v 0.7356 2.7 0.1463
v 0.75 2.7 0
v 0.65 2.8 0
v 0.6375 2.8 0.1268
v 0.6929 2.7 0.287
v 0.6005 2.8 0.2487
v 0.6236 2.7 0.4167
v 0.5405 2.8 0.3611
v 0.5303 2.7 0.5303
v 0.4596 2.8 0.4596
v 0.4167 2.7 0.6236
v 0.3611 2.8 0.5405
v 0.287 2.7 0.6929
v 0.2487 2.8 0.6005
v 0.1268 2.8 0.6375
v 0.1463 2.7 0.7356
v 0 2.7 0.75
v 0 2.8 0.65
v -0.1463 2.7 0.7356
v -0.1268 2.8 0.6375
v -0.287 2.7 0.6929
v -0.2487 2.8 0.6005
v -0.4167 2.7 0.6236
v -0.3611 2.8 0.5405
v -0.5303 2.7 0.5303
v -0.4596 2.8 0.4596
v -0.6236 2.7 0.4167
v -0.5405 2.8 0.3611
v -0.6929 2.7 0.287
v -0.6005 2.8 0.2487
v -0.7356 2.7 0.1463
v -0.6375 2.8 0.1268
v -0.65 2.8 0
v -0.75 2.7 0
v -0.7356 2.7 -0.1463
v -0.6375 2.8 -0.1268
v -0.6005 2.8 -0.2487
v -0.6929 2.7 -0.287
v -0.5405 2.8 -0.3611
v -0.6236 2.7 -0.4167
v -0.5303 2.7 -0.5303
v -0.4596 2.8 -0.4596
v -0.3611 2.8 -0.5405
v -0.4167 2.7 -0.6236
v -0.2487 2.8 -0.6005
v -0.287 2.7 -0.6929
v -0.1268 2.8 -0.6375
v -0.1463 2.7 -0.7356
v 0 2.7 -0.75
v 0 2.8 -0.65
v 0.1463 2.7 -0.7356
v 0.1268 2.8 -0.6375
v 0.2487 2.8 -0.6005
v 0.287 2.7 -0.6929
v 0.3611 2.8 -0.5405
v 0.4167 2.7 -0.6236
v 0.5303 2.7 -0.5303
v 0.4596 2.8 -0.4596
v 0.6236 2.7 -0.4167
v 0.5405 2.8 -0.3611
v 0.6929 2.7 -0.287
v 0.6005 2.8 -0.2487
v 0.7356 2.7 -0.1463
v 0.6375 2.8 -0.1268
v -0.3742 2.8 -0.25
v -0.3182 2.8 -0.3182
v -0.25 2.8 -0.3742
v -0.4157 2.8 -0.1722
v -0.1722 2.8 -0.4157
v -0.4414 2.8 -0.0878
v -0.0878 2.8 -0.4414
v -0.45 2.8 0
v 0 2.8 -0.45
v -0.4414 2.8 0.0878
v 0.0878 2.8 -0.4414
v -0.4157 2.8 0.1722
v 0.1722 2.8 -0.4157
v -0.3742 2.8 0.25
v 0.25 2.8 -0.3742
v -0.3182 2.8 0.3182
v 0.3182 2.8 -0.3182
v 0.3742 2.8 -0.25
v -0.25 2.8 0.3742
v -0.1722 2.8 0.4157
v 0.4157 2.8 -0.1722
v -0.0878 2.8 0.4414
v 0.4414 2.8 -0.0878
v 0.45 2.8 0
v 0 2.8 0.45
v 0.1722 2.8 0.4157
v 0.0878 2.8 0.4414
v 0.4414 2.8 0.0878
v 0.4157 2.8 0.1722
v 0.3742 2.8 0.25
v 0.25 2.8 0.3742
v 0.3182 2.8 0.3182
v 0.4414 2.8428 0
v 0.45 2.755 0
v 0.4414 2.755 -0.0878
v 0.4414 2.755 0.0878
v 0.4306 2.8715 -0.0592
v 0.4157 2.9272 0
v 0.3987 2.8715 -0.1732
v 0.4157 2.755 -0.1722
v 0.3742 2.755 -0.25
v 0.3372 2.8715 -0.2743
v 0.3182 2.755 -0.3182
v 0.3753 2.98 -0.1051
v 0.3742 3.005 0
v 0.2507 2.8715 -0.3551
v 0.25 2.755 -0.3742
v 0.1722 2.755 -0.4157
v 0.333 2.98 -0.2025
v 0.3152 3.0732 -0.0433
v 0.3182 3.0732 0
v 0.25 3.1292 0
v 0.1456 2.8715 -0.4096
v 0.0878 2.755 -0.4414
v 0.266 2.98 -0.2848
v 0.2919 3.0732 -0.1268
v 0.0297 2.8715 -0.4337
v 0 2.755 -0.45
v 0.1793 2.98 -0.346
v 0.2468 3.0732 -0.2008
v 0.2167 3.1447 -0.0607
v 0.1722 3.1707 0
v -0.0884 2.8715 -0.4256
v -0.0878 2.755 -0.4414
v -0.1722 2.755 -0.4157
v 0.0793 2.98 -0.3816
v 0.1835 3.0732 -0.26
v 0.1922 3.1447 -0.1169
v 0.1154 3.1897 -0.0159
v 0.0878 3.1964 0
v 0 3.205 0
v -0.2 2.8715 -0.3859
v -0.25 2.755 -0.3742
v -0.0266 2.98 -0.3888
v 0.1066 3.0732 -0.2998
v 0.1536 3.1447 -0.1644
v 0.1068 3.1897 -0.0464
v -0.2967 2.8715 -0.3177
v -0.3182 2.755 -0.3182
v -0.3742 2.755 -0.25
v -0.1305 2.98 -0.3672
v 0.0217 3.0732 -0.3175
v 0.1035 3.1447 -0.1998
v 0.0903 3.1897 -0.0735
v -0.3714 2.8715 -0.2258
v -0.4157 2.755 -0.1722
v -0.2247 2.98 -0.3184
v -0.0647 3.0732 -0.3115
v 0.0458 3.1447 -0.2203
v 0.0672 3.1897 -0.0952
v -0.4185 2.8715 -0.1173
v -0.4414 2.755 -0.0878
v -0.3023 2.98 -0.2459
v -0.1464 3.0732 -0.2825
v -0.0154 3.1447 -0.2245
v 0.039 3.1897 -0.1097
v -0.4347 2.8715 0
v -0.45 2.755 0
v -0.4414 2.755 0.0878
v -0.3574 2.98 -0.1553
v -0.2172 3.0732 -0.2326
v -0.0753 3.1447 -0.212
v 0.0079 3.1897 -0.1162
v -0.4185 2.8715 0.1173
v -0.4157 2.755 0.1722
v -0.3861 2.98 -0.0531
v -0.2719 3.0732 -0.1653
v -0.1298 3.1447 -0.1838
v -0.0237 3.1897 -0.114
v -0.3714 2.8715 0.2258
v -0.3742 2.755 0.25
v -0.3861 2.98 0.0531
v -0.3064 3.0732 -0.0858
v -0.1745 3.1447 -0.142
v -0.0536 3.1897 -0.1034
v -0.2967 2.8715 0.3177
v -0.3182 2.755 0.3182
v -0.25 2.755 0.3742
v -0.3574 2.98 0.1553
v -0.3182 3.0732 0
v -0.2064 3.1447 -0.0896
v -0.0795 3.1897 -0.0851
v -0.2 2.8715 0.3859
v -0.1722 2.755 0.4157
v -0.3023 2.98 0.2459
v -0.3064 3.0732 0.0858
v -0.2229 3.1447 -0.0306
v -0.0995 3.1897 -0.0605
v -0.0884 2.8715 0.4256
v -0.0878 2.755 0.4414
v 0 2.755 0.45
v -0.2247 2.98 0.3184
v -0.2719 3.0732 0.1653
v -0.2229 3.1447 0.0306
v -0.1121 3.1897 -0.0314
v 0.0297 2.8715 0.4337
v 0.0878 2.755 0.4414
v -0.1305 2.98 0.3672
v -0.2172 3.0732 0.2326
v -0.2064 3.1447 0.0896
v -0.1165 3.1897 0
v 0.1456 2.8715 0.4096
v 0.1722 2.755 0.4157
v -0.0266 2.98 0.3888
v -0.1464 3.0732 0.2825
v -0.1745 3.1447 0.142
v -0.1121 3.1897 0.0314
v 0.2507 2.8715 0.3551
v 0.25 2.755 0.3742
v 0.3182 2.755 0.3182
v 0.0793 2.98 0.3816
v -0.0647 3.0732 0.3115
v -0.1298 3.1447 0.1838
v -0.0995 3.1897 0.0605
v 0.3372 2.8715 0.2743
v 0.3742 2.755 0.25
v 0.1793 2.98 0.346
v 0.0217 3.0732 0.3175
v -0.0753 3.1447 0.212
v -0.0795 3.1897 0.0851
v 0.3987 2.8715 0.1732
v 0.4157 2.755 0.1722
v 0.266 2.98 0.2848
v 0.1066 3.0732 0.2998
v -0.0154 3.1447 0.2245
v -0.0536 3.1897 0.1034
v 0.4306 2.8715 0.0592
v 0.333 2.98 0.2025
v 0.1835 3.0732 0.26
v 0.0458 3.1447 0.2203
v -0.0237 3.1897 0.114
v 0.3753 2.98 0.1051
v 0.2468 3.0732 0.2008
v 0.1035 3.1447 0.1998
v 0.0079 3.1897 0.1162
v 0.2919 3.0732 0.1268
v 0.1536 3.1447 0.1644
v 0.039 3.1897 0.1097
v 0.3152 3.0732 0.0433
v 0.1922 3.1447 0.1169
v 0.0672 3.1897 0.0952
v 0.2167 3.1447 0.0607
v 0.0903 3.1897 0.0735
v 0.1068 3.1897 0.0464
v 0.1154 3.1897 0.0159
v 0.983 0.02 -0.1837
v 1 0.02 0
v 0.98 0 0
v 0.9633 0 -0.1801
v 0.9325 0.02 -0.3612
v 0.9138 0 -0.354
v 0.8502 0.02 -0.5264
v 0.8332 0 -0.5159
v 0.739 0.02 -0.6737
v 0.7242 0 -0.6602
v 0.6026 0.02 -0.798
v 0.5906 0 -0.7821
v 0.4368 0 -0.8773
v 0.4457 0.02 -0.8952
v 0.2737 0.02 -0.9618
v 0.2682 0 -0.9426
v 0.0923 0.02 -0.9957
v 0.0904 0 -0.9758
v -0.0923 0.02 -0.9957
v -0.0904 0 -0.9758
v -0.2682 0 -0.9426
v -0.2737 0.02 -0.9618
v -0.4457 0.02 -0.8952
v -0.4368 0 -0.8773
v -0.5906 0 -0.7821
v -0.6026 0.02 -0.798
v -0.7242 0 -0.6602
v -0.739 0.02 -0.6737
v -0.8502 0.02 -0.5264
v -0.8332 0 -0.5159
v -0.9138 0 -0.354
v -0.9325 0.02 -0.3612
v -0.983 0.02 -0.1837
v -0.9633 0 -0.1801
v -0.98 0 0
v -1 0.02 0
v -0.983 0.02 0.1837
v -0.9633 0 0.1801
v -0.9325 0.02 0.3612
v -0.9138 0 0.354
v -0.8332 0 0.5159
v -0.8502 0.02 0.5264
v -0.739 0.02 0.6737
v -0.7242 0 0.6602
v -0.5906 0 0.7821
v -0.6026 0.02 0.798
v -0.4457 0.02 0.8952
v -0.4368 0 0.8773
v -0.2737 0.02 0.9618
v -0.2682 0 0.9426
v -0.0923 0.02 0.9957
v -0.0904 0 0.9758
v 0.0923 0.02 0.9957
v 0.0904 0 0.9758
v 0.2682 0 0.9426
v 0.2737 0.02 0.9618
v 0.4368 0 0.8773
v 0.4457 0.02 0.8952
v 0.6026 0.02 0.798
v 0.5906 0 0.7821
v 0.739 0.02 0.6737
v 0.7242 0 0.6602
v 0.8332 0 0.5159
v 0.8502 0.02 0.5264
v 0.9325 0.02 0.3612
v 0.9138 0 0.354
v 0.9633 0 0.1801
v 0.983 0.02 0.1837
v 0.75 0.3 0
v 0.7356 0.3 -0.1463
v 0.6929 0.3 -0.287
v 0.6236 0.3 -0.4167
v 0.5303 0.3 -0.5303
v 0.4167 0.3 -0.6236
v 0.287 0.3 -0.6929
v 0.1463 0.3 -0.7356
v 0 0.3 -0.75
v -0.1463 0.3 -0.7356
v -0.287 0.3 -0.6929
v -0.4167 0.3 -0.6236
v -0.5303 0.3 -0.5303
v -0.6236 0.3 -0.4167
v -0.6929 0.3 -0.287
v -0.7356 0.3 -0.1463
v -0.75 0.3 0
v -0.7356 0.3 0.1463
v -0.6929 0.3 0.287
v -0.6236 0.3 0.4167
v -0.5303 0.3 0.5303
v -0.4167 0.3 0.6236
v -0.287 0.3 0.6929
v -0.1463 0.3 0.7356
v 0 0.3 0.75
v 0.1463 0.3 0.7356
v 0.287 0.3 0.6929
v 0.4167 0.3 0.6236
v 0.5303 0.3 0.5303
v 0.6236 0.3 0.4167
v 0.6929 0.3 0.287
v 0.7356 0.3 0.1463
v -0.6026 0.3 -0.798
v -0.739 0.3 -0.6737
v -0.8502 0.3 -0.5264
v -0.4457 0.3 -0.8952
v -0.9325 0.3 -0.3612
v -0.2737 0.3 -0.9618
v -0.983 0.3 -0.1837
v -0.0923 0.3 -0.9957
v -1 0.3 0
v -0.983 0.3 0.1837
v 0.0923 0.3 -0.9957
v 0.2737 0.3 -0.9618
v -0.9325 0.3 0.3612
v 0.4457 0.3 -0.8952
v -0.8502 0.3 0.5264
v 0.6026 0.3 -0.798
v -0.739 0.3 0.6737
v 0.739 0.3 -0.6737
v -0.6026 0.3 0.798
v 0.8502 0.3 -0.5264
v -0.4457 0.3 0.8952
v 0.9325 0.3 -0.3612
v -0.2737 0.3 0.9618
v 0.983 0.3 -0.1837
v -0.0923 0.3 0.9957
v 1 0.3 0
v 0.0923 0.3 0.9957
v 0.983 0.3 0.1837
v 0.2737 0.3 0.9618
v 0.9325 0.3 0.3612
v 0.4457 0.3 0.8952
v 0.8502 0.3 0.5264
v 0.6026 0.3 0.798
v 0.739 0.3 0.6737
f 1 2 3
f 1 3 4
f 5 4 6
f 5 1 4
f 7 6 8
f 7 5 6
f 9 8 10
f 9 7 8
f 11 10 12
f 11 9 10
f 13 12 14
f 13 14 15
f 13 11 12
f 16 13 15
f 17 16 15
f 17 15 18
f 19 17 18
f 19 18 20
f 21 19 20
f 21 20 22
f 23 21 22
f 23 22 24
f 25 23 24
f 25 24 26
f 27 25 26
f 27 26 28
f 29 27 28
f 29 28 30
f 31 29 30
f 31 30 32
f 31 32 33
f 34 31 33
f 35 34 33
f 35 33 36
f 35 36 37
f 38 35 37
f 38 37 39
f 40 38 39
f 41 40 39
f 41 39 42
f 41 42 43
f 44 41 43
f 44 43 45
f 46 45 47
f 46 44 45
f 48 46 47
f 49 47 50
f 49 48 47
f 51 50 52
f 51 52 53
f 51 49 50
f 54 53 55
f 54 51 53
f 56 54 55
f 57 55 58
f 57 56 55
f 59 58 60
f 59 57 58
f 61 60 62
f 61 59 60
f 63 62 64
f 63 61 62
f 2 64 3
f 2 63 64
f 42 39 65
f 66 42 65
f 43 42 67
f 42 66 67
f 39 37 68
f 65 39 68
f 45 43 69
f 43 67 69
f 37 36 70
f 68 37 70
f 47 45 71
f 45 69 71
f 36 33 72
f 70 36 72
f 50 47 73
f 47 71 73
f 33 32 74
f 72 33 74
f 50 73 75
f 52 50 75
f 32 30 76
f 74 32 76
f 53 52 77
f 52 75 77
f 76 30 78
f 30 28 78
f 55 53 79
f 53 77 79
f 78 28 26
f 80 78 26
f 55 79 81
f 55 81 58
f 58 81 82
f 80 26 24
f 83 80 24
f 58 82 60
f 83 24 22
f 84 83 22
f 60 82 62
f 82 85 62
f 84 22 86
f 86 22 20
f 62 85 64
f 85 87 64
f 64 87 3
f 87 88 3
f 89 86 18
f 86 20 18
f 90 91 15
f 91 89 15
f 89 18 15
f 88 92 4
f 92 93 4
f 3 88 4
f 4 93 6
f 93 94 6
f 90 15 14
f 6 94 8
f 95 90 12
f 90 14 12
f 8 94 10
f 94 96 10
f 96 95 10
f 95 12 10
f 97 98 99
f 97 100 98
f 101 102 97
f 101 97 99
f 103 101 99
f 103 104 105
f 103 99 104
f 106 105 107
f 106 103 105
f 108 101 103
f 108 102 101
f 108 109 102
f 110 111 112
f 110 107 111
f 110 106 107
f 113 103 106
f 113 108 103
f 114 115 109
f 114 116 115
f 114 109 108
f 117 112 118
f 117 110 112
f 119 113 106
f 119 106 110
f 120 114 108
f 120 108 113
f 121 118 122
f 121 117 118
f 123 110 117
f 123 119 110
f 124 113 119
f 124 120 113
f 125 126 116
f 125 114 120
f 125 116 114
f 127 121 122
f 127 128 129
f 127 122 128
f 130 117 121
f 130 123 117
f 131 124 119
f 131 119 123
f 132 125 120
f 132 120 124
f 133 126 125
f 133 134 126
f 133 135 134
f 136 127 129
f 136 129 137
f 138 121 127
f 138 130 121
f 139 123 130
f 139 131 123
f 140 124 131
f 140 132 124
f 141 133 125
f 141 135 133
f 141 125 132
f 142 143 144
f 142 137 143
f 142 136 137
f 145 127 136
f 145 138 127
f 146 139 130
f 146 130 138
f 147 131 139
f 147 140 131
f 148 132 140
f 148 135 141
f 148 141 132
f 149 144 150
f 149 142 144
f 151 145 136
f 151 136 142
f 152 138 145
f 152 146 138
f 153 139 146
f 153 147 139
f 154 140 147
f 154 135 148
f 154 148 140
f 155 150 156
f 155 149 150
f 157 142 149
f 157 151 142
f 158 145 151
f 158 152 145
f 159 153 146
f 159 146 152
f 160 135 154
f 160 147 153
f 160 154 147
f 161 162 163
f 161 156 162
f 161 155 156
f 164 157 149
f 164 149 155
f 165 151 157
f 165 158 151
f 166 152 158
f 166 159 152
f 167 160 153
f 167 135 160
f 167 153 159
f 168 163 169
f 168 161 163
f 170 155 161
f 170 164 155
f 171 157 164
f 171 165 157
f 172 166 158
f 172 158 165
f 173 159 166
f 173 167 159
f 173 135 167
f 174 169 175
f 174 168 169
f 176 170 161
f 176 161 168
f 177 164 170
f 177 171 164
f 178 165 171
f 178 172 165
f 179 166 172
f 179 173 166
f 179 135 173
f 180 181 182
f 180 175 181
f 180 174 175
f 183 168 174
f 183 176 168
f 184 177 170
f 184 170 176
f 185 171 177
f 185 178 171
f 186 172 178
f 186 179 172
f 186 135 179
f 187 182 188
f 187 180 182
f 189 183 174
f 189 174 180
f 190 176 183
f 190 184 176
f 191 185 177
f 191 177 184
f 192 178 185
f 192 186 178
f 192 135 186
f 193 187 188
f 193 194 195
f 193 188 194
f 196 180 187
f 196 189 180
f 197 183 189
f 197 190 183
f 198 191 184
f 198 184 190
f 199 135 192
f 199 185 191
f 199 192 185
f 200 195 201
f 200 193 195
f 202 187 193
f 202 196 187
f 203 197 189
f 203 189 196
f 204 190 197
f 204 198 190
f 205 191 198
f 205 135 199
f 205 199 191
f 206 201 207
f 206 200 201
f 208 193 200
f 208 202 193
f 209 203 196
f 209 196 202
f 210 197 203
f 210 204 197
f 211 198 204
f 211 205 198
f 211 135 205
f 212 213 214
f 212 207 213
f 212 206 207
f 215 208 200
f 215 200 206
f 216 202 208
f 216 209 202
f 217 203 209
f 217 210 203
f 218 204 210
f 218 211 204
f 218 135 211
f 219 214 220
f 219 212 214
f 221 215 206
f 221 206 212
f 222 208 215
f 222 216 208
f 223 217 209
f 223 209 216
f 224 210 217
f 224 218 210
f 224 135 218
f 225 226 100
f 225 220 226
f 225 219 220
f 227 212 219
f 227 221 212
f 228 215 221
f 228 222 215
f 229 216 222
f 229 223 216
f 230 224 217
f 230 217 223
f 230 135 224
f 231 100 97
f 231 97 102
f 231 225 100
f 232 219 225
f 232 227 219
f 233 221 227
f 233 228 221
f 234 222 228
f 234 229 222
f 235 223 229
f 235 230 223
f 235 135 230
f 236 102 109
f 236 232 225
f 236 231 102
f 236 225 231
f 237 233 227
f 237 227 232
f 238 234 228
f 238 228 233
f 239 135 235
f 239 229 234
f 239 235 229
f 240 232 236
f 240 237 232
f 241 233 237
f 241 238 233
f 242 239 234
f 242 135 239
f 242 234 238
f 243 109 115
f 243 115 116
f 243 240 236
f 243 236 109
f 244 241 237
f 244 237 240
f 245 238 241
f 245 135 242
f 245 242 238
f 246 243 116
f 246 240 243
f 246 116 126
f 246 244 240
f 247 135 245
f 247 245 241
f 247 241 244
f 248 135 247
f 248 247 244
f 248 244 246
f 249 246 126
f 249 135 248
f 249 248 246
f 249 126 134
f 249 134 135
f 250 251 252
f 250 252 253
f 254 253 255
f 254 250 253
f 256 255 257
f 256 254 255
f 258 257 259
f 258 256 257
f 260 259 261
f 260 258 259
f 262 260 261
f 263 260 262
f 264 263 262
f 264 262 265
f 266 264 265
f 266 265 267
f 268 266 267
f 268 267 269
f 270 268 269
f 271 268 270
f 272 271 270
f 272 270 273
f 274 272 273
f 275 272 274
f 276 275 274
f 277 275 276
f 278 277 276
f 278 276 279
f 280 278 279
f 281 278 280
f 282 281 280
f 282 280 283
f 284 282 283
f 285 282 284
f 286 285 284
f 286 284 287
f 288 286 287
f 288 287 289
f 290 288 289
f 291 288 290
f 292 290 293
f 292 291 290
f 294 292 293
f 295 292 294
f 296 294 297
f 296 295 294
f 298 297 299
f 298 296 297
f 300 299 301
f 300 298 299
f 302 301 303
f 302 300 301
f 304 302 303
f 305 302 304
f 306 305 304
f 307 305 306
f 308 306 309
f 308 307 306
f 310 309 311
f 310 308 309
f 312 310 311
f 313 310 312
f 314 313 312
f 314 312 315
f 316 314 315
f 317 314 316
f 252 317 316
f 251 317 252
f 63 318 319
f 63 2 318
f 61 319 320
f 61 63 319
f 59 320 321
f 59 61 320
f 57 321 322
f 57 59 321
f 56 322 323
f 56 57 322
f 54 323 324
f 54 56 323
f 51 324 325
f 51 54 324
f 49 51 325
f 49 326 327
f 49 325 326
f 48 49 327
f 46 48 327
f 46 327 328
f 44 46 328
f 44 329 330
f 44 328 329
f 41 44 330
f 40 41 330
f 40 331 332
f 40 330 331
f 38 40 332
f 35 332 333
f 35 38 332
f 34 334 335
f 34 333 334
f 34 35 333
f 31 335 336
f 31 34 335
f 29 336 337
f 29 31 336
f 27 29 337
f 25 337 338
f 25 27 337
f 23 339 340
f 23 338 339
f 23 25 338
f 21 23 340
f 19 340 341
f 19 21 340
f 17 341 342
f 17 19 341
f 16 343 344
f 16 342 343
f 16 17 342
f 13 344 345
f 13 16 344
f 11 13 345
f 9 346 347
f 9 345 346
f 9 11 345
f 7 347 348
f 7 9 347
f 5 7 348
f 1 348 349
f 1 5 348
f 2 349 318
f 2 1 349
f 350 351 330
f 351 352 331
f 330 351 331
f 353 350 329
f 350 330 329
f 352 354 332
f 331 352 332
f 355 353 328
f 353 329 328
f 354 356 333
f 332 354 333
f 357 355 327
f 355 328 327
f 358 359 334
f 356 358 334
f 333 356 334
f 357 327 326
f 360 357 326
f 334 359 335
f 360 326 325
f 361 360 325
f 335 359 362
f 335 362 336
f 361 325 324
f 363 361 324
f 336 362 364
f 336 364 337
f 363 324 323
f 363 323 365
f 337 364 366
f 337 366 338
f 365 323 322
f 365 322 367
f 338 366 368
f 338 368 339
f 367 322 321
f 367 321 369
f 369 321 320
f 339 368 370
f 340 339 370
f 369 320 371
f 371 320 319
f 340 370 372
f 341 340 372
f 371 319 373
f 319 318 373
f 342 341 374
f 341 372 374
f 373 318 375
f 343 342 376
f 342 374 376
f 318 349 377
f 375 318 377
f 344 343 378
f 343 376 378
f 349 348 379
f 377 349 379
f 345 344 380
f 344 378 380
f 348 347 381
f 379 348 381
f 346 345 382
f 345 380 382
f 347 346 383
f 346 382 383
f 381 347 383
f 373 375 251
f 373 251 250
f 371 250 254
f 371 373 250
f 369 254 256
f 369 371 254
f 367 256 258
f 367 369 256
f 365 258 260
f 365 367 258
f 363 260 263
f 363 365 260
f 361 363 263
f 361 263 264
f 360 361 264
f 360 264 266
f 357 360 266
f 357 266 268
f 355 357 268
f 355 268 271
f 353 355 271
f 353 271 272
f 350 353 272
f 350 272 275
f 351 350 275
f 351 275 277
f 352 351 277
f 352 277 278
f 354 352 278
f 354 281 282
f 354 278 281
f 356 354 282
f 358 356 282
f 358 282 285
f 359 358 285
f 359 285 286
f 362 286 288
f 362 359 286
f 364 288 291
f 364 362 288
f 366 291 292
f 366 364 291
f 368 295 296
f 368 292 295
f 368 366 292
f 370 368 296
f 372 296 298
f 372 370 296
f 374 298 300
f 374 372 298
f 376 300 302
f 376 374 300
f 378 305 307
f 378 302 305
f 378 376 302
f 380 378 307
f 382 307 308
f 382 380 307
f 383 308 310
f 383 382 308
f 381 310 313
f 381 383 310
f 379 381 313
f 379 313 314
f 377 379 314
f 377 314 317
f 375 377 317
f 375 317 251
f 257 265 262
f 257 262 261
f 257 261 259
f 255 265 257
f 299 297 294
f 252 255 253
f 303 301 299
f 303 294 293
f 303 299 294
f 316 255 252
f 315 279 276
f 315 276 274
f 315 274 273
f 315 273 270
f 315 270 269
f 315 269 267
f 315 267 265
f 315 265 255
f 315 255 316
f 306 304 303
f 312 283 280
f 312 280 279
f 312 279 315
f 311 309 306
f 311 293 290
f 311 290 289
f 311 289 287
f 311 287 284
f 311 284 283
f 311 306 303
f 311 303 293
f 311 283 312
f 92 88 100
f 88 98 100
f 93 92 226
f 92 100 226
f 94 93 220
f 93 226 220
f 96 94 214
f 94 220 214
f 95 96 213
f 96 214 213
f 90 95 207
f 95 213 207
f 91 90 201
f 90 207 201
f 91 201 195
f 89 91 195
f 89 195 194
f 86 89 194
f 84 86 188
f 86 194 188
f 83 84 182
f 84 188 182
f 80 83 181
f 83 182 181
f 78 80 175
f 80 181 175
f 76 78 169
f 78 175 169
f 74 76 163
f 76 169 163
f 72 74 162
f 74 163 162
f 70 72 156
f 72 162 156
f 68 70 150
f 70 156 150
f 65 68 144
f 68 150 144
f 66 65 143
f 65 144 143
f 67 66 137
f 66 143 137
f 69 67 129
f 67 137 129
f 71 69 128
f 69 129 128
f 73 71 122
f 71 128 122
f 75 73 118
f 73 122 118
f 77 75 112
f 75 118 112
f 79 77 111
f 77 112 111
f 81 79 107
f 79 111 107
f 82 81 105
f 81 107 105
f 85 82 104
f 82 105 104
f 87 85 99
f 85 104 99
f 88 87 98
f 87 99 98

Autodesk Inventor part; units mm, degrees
ref_plane "YZ Plane" through (0, 0, 0) normal (1, 0, 0) x (0, 1, 0)
ref_plane "XZ Plane" through (0, 0, 0) normal (0, 1, 0) x (-1, 0, 0)
ref_plane "XY Plane" through (0, 0, 0) normal (0, 0, 1) x (1, 0, 0)
sketch "Sketch1" plane through (0, 0, 0) normal (0, 0, 1) x (1, 0, 0)
  line L0 (0, 0) -> (0.98, 0)
  line L1 (0.98, 0) -> (1, 0.02)
  line L2 (1, 0.02) -> (1, 0.3)
  line L3 (1, 0.3) -> (0.75, 0.3)
  line L4 (0.75, 0.3) -> (0.75, 2.7)
  line L5 (0.75, 2.7) -> (0.65, 2.8)
  line L6 (0.65, 2.8) -> (0.45, 2.8)
  line L7 (0.45, 2.8) -> (0.45, 2.755)
  arc A0 (0.45, 2.755) -> (0, 3.205) centre (0, 2.755) ccw
  line L8 (0, 3.205) -> (0, 0)
  dimension "d0" = 135
  dimension "d1" = 45
  dimension "d2" = 0.45
  dimension "d3" = 1
  dimension "d4" = 0.02
  dimension "d5" = 0.1
  dimension "d6" = 0.75
  dimension "d7" = 3.205
  dimension "d8" = 2.8
  dimension "d9" = 0.3
revolve "Revolution1" add sketch "Sketch1" angle 360 about axis through (0, 3.205, 0) along (0, -1, 0)
properties part number "Pogo-pin"
